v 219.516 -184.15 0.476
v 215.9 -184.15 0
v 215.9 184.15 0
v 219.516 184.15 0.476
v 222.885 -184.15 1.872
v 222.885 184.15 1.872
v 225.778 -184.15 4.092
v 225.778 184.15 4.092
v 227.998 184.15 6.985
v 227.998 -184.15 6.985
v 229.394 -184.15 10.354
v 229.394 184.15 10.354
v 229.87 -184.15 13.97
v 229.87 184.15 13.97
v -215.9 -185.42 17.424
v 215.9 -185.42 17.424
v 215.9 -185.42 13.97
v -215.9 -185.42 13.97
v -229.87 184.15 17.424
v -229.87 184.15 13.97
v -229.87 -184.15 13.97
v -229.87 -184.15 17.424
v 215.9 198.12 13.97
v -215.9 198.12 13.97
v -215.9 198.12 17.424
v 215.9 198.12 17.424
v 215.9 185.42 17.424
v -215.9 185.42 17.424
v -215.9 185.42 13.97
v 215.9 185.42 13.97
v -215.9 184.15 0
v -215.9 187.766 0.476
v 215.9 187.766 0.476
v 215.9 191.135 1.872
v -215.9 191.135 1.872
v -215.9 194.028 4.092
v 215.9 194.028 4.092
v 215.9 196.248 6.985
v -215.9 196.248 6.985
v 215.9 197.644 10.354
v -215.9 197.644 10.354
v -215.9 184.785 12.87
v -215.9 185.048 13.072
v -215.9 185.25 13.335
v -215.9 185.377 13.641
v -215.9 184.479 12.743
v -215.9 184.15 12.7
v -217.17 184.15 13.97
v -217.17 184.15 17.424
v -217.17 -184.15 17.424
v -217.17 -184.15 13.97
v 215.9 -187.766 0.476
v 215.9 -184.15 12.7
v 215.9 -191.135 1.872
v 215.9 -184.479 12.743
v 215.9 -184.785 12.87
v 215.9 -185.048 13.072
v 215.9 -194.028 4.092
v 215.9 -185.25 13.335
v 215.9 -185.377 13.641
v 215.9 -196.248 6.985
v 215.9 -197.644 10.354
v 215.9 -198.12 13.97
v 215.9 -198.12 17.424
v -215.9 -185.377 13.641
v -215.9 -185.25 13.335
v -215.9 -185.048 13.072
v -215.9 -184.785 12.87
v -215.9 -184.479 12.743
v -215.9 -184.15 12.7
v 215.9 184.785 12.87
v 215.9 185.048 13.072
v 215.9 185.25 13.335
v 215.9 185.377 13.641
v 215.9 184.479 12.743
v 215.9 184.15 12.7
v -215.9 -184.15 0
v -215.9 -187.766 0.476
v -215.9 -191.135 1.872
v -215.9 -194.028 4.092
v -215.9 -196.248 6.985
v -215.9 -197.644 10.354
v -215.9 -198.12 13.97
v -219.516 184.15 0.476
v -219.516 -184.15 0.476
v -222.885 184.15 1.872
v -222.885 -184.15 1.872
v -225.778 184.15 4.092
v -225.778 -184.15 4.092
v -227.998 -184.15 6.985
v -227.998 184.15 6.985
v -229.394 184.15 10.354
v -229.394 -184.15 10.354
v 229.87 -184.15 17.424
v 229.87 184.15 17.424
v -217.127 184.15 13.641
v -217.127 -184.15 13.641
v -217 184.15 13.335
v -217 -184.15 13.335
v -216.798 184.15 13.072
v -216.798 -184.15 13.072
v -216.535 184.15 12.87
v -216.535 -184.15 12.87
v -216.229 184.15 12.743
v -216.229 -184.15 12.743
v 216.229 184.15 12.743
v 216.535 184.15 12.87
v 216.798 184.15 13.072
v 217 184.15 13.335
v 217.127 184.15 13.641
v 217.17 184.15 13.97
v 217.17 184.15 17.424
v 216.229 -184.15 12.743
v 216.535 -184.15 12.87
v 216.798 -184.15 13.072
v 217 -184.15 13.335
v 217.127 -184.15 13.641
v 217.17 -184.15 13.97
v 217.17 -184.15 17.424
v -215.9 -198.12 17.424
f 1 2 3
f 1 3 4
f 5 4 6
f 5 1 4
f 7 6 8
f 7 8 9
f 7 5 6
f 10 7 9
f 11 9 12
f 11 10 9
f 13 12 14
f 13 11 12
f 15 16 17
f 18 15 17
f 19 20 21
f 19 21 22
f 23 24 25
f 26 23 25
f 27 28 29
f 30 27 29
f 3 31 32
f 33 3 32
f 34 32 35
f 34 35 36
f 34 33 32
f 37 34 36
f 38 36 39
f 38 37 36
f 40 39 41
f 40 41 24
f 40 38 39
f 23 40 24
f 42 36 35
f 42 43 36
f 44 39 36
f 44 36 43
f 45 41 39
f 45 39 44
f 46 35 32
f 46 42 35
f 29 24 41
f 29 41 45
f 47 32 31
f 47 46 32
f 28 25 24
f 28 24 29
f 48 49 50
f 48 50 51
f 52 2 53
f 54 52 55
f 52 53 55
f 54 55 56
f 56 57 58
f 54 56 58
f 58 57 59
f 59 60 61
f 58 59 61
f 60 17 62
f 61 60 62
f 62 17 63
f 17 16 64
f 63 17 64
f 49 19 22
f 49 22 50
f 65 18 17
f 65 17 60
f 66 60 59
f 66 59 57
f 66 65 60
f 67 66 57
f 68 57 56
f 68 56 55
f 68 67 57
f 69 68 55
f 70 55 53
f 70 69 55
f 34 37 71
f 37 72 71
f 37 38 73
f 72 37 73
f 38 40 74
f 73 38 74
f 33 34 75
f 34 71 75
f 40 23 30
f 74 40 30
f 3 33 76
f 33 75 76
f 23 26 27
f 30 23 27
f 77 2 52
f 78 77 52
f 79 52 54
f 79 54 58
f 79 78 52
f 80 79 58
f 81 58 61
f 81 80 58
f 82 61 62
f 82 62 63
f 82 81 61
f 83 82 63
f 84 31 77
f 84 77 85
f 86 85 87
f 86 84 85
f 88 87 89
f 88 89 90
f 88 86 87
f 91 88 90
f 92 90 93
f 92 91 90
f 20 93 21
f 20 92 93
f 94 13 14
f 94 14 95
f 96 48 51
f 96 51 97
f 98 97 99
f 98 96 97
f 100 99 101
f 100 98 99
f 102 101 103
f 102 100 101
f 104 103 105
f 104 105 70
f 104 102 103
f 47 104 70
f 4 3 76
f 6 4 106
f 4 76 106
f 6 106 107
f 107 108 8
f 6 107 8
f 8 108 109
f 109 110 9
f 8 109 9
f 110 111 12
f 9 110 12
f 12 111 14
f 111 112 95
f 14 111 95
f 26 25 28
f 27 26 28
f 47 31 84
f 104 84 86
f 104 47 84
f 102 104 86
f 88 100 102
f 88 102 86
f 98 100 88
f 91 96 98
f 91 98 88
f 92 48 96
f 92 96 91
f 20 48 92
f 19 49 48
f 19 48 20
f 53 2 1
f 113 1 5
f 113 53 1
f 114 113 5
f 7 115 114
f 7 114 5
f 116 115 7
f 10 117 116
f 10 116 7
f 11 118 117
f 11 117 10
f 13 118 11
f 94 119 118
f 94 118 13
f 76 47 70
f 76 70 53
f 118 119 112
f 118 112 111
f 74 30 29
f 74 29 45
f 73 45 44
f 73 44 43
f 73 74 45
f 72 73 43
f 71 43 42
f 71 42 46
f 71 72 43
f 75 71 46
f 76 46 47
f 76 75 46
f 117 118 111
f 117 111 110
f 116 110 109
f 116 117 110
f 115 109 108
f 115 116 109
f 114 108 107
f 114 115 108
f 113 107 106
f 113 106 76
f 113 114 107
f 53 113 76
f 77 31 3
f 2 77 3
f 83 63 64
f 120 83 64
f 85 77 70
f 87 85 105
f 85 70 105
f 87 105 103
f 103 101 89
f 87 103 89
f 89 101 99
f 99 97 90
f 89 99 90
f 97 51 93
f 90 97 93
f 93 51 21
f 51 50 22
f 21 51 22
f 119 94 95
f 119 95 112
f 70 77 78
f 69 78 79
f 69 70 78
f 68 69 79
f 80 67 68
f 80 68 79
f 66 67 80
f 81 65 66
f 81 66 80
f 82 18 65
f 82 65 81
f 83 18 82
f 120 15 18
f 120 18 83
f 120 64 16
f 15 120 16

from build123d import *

# Parameters (mm, degrees)
SKETCH1_W          = 431.8
SKETCH1_H          = 368.3
BASE_FLANGE1_DEPTH = 12.7
EDGE_FLANGE1_DEPTH = 431.8
EDGE_FLANGE2_DEPTH = 431.8
EDGE_FLANGE3_DEPTH = 368.3
EDGE_FLANGE4_DEPTH = 368.3


# Sheet-metal steps are written as plain solids
with BuildPart() as part:
    # Sketch1 → Base-Flange1 (new body)
    with BuildSketch(Plane.XY):
        Rectangle(SKETCH1_W, SKETCH1_H)
    extrude(amount=BASE_FLANGE1_DEPTH)

    # Edge-Flange1 section (across the edge) → Edge-Flange1 (add)
    with BuildSketch(Plane(origin=(215.9, 185.42, 12.7), x_dir=(0, -1, 0), z_dir=(-1, 0, 0))):
        with BuildLine():
            Line((-12.7, 1.27), (-12.7, 4.7244))
            Line((-12.7, 4.7244), (0, 4.7244))
            Line((0, 4.7244), (0, 1.27))
            ThreePointArc((0, 1.27), (0.371974388, 0.371974388), (1.27, 0))
            Line((1.27, 0), (1.27, -12.7))
            ThreePointArc((1.27, -12.7), (-8.608281733, -8.608281733), (-12.7, 1.27))
        make_face()
    extrude(amount=EDGE_FLANGE1_DEPTH)

    # Edge-Flange2 section (across the edge) → Edge-Flange2 (add)
    with BuildSketch(Plane(origin=(-215.9, -185.42, 12.7), x_dir=(0, 1, 0), z_dir=(1, 0, 0))):
        with BuildLine():
            Line((-12.7, 1.27), (-12.7, 4.7244))
            Line((-12.7, 4.7244), (0, 4.7244))
            Line((0, 4.7244), (0, 1.27))
            ThreePointArc((0, 1.27), (0.371974388, 0.371974388), (1.27, 0))
            Line((1.27, 0), (1.27, -12.7))
            ThreePointArc((1.27, -12.7), (-8.608281733, -8.608281733), (-12.7, 1.27))
        make_face()
    extrude(amount=EDGE_FLANGE2_DEPTH)

    # Edge-Flange3 section (across the edge) → Edge-Flange3 (add)
    with BuildSketch(Plane(origin=(217.17, -184.15, 12.7), x_dir=(-1, 0, 0), z_dir=(0, 1, 0))):
        with BuildLine():
            Line((-12.7, 1.27), (-12.7, 4.7244))
            Line((-12.7, 4.7244), (0, 4.7244))
            Line((0, 4.7244), (0, 1.27))
            ThreePointArc((0, 1.27), (0.371974388, 0.371974388), (1.27, 0))
            Line((1.27, 0), (1.27, -12.7))
            ThreePointArc((1.27, -12.7), (-8.608281733, -8.608281733), (-12.7, 1.27))
        make_face()
    extrude(amount=EDGE_FLANGE3_DEPTH)

    # Edge-Flange4 section (across the edge) → Edge-Flange4 (add)
    with BuildSketch(Plane(origin=(-217.17, 184.15, 12.7), x_dir=(1, 0, 0), z_dir=(0, -1, 0))):
        with BuildLine():
            Line((-12.7, 1.27), (-12.7, 4.7244))
            Line((-12.7, 4.7244), (0, 4.7244))
            Line((0, 4.7244), (0, 1.27))
            ThreePointArc((0, 1.27), (0.371974388, 0.371974388), (1.27, 0))
            Line((1.27, 0), (1.27, -12.7))
            ThreePointArc((1.27, -12.7), (-8.608281733, -8.608281733), (-12.7, 1.27))
        make_face()
    extrude(amount=EDGE_FLANGE4_DEPTH)


solid = part.part
